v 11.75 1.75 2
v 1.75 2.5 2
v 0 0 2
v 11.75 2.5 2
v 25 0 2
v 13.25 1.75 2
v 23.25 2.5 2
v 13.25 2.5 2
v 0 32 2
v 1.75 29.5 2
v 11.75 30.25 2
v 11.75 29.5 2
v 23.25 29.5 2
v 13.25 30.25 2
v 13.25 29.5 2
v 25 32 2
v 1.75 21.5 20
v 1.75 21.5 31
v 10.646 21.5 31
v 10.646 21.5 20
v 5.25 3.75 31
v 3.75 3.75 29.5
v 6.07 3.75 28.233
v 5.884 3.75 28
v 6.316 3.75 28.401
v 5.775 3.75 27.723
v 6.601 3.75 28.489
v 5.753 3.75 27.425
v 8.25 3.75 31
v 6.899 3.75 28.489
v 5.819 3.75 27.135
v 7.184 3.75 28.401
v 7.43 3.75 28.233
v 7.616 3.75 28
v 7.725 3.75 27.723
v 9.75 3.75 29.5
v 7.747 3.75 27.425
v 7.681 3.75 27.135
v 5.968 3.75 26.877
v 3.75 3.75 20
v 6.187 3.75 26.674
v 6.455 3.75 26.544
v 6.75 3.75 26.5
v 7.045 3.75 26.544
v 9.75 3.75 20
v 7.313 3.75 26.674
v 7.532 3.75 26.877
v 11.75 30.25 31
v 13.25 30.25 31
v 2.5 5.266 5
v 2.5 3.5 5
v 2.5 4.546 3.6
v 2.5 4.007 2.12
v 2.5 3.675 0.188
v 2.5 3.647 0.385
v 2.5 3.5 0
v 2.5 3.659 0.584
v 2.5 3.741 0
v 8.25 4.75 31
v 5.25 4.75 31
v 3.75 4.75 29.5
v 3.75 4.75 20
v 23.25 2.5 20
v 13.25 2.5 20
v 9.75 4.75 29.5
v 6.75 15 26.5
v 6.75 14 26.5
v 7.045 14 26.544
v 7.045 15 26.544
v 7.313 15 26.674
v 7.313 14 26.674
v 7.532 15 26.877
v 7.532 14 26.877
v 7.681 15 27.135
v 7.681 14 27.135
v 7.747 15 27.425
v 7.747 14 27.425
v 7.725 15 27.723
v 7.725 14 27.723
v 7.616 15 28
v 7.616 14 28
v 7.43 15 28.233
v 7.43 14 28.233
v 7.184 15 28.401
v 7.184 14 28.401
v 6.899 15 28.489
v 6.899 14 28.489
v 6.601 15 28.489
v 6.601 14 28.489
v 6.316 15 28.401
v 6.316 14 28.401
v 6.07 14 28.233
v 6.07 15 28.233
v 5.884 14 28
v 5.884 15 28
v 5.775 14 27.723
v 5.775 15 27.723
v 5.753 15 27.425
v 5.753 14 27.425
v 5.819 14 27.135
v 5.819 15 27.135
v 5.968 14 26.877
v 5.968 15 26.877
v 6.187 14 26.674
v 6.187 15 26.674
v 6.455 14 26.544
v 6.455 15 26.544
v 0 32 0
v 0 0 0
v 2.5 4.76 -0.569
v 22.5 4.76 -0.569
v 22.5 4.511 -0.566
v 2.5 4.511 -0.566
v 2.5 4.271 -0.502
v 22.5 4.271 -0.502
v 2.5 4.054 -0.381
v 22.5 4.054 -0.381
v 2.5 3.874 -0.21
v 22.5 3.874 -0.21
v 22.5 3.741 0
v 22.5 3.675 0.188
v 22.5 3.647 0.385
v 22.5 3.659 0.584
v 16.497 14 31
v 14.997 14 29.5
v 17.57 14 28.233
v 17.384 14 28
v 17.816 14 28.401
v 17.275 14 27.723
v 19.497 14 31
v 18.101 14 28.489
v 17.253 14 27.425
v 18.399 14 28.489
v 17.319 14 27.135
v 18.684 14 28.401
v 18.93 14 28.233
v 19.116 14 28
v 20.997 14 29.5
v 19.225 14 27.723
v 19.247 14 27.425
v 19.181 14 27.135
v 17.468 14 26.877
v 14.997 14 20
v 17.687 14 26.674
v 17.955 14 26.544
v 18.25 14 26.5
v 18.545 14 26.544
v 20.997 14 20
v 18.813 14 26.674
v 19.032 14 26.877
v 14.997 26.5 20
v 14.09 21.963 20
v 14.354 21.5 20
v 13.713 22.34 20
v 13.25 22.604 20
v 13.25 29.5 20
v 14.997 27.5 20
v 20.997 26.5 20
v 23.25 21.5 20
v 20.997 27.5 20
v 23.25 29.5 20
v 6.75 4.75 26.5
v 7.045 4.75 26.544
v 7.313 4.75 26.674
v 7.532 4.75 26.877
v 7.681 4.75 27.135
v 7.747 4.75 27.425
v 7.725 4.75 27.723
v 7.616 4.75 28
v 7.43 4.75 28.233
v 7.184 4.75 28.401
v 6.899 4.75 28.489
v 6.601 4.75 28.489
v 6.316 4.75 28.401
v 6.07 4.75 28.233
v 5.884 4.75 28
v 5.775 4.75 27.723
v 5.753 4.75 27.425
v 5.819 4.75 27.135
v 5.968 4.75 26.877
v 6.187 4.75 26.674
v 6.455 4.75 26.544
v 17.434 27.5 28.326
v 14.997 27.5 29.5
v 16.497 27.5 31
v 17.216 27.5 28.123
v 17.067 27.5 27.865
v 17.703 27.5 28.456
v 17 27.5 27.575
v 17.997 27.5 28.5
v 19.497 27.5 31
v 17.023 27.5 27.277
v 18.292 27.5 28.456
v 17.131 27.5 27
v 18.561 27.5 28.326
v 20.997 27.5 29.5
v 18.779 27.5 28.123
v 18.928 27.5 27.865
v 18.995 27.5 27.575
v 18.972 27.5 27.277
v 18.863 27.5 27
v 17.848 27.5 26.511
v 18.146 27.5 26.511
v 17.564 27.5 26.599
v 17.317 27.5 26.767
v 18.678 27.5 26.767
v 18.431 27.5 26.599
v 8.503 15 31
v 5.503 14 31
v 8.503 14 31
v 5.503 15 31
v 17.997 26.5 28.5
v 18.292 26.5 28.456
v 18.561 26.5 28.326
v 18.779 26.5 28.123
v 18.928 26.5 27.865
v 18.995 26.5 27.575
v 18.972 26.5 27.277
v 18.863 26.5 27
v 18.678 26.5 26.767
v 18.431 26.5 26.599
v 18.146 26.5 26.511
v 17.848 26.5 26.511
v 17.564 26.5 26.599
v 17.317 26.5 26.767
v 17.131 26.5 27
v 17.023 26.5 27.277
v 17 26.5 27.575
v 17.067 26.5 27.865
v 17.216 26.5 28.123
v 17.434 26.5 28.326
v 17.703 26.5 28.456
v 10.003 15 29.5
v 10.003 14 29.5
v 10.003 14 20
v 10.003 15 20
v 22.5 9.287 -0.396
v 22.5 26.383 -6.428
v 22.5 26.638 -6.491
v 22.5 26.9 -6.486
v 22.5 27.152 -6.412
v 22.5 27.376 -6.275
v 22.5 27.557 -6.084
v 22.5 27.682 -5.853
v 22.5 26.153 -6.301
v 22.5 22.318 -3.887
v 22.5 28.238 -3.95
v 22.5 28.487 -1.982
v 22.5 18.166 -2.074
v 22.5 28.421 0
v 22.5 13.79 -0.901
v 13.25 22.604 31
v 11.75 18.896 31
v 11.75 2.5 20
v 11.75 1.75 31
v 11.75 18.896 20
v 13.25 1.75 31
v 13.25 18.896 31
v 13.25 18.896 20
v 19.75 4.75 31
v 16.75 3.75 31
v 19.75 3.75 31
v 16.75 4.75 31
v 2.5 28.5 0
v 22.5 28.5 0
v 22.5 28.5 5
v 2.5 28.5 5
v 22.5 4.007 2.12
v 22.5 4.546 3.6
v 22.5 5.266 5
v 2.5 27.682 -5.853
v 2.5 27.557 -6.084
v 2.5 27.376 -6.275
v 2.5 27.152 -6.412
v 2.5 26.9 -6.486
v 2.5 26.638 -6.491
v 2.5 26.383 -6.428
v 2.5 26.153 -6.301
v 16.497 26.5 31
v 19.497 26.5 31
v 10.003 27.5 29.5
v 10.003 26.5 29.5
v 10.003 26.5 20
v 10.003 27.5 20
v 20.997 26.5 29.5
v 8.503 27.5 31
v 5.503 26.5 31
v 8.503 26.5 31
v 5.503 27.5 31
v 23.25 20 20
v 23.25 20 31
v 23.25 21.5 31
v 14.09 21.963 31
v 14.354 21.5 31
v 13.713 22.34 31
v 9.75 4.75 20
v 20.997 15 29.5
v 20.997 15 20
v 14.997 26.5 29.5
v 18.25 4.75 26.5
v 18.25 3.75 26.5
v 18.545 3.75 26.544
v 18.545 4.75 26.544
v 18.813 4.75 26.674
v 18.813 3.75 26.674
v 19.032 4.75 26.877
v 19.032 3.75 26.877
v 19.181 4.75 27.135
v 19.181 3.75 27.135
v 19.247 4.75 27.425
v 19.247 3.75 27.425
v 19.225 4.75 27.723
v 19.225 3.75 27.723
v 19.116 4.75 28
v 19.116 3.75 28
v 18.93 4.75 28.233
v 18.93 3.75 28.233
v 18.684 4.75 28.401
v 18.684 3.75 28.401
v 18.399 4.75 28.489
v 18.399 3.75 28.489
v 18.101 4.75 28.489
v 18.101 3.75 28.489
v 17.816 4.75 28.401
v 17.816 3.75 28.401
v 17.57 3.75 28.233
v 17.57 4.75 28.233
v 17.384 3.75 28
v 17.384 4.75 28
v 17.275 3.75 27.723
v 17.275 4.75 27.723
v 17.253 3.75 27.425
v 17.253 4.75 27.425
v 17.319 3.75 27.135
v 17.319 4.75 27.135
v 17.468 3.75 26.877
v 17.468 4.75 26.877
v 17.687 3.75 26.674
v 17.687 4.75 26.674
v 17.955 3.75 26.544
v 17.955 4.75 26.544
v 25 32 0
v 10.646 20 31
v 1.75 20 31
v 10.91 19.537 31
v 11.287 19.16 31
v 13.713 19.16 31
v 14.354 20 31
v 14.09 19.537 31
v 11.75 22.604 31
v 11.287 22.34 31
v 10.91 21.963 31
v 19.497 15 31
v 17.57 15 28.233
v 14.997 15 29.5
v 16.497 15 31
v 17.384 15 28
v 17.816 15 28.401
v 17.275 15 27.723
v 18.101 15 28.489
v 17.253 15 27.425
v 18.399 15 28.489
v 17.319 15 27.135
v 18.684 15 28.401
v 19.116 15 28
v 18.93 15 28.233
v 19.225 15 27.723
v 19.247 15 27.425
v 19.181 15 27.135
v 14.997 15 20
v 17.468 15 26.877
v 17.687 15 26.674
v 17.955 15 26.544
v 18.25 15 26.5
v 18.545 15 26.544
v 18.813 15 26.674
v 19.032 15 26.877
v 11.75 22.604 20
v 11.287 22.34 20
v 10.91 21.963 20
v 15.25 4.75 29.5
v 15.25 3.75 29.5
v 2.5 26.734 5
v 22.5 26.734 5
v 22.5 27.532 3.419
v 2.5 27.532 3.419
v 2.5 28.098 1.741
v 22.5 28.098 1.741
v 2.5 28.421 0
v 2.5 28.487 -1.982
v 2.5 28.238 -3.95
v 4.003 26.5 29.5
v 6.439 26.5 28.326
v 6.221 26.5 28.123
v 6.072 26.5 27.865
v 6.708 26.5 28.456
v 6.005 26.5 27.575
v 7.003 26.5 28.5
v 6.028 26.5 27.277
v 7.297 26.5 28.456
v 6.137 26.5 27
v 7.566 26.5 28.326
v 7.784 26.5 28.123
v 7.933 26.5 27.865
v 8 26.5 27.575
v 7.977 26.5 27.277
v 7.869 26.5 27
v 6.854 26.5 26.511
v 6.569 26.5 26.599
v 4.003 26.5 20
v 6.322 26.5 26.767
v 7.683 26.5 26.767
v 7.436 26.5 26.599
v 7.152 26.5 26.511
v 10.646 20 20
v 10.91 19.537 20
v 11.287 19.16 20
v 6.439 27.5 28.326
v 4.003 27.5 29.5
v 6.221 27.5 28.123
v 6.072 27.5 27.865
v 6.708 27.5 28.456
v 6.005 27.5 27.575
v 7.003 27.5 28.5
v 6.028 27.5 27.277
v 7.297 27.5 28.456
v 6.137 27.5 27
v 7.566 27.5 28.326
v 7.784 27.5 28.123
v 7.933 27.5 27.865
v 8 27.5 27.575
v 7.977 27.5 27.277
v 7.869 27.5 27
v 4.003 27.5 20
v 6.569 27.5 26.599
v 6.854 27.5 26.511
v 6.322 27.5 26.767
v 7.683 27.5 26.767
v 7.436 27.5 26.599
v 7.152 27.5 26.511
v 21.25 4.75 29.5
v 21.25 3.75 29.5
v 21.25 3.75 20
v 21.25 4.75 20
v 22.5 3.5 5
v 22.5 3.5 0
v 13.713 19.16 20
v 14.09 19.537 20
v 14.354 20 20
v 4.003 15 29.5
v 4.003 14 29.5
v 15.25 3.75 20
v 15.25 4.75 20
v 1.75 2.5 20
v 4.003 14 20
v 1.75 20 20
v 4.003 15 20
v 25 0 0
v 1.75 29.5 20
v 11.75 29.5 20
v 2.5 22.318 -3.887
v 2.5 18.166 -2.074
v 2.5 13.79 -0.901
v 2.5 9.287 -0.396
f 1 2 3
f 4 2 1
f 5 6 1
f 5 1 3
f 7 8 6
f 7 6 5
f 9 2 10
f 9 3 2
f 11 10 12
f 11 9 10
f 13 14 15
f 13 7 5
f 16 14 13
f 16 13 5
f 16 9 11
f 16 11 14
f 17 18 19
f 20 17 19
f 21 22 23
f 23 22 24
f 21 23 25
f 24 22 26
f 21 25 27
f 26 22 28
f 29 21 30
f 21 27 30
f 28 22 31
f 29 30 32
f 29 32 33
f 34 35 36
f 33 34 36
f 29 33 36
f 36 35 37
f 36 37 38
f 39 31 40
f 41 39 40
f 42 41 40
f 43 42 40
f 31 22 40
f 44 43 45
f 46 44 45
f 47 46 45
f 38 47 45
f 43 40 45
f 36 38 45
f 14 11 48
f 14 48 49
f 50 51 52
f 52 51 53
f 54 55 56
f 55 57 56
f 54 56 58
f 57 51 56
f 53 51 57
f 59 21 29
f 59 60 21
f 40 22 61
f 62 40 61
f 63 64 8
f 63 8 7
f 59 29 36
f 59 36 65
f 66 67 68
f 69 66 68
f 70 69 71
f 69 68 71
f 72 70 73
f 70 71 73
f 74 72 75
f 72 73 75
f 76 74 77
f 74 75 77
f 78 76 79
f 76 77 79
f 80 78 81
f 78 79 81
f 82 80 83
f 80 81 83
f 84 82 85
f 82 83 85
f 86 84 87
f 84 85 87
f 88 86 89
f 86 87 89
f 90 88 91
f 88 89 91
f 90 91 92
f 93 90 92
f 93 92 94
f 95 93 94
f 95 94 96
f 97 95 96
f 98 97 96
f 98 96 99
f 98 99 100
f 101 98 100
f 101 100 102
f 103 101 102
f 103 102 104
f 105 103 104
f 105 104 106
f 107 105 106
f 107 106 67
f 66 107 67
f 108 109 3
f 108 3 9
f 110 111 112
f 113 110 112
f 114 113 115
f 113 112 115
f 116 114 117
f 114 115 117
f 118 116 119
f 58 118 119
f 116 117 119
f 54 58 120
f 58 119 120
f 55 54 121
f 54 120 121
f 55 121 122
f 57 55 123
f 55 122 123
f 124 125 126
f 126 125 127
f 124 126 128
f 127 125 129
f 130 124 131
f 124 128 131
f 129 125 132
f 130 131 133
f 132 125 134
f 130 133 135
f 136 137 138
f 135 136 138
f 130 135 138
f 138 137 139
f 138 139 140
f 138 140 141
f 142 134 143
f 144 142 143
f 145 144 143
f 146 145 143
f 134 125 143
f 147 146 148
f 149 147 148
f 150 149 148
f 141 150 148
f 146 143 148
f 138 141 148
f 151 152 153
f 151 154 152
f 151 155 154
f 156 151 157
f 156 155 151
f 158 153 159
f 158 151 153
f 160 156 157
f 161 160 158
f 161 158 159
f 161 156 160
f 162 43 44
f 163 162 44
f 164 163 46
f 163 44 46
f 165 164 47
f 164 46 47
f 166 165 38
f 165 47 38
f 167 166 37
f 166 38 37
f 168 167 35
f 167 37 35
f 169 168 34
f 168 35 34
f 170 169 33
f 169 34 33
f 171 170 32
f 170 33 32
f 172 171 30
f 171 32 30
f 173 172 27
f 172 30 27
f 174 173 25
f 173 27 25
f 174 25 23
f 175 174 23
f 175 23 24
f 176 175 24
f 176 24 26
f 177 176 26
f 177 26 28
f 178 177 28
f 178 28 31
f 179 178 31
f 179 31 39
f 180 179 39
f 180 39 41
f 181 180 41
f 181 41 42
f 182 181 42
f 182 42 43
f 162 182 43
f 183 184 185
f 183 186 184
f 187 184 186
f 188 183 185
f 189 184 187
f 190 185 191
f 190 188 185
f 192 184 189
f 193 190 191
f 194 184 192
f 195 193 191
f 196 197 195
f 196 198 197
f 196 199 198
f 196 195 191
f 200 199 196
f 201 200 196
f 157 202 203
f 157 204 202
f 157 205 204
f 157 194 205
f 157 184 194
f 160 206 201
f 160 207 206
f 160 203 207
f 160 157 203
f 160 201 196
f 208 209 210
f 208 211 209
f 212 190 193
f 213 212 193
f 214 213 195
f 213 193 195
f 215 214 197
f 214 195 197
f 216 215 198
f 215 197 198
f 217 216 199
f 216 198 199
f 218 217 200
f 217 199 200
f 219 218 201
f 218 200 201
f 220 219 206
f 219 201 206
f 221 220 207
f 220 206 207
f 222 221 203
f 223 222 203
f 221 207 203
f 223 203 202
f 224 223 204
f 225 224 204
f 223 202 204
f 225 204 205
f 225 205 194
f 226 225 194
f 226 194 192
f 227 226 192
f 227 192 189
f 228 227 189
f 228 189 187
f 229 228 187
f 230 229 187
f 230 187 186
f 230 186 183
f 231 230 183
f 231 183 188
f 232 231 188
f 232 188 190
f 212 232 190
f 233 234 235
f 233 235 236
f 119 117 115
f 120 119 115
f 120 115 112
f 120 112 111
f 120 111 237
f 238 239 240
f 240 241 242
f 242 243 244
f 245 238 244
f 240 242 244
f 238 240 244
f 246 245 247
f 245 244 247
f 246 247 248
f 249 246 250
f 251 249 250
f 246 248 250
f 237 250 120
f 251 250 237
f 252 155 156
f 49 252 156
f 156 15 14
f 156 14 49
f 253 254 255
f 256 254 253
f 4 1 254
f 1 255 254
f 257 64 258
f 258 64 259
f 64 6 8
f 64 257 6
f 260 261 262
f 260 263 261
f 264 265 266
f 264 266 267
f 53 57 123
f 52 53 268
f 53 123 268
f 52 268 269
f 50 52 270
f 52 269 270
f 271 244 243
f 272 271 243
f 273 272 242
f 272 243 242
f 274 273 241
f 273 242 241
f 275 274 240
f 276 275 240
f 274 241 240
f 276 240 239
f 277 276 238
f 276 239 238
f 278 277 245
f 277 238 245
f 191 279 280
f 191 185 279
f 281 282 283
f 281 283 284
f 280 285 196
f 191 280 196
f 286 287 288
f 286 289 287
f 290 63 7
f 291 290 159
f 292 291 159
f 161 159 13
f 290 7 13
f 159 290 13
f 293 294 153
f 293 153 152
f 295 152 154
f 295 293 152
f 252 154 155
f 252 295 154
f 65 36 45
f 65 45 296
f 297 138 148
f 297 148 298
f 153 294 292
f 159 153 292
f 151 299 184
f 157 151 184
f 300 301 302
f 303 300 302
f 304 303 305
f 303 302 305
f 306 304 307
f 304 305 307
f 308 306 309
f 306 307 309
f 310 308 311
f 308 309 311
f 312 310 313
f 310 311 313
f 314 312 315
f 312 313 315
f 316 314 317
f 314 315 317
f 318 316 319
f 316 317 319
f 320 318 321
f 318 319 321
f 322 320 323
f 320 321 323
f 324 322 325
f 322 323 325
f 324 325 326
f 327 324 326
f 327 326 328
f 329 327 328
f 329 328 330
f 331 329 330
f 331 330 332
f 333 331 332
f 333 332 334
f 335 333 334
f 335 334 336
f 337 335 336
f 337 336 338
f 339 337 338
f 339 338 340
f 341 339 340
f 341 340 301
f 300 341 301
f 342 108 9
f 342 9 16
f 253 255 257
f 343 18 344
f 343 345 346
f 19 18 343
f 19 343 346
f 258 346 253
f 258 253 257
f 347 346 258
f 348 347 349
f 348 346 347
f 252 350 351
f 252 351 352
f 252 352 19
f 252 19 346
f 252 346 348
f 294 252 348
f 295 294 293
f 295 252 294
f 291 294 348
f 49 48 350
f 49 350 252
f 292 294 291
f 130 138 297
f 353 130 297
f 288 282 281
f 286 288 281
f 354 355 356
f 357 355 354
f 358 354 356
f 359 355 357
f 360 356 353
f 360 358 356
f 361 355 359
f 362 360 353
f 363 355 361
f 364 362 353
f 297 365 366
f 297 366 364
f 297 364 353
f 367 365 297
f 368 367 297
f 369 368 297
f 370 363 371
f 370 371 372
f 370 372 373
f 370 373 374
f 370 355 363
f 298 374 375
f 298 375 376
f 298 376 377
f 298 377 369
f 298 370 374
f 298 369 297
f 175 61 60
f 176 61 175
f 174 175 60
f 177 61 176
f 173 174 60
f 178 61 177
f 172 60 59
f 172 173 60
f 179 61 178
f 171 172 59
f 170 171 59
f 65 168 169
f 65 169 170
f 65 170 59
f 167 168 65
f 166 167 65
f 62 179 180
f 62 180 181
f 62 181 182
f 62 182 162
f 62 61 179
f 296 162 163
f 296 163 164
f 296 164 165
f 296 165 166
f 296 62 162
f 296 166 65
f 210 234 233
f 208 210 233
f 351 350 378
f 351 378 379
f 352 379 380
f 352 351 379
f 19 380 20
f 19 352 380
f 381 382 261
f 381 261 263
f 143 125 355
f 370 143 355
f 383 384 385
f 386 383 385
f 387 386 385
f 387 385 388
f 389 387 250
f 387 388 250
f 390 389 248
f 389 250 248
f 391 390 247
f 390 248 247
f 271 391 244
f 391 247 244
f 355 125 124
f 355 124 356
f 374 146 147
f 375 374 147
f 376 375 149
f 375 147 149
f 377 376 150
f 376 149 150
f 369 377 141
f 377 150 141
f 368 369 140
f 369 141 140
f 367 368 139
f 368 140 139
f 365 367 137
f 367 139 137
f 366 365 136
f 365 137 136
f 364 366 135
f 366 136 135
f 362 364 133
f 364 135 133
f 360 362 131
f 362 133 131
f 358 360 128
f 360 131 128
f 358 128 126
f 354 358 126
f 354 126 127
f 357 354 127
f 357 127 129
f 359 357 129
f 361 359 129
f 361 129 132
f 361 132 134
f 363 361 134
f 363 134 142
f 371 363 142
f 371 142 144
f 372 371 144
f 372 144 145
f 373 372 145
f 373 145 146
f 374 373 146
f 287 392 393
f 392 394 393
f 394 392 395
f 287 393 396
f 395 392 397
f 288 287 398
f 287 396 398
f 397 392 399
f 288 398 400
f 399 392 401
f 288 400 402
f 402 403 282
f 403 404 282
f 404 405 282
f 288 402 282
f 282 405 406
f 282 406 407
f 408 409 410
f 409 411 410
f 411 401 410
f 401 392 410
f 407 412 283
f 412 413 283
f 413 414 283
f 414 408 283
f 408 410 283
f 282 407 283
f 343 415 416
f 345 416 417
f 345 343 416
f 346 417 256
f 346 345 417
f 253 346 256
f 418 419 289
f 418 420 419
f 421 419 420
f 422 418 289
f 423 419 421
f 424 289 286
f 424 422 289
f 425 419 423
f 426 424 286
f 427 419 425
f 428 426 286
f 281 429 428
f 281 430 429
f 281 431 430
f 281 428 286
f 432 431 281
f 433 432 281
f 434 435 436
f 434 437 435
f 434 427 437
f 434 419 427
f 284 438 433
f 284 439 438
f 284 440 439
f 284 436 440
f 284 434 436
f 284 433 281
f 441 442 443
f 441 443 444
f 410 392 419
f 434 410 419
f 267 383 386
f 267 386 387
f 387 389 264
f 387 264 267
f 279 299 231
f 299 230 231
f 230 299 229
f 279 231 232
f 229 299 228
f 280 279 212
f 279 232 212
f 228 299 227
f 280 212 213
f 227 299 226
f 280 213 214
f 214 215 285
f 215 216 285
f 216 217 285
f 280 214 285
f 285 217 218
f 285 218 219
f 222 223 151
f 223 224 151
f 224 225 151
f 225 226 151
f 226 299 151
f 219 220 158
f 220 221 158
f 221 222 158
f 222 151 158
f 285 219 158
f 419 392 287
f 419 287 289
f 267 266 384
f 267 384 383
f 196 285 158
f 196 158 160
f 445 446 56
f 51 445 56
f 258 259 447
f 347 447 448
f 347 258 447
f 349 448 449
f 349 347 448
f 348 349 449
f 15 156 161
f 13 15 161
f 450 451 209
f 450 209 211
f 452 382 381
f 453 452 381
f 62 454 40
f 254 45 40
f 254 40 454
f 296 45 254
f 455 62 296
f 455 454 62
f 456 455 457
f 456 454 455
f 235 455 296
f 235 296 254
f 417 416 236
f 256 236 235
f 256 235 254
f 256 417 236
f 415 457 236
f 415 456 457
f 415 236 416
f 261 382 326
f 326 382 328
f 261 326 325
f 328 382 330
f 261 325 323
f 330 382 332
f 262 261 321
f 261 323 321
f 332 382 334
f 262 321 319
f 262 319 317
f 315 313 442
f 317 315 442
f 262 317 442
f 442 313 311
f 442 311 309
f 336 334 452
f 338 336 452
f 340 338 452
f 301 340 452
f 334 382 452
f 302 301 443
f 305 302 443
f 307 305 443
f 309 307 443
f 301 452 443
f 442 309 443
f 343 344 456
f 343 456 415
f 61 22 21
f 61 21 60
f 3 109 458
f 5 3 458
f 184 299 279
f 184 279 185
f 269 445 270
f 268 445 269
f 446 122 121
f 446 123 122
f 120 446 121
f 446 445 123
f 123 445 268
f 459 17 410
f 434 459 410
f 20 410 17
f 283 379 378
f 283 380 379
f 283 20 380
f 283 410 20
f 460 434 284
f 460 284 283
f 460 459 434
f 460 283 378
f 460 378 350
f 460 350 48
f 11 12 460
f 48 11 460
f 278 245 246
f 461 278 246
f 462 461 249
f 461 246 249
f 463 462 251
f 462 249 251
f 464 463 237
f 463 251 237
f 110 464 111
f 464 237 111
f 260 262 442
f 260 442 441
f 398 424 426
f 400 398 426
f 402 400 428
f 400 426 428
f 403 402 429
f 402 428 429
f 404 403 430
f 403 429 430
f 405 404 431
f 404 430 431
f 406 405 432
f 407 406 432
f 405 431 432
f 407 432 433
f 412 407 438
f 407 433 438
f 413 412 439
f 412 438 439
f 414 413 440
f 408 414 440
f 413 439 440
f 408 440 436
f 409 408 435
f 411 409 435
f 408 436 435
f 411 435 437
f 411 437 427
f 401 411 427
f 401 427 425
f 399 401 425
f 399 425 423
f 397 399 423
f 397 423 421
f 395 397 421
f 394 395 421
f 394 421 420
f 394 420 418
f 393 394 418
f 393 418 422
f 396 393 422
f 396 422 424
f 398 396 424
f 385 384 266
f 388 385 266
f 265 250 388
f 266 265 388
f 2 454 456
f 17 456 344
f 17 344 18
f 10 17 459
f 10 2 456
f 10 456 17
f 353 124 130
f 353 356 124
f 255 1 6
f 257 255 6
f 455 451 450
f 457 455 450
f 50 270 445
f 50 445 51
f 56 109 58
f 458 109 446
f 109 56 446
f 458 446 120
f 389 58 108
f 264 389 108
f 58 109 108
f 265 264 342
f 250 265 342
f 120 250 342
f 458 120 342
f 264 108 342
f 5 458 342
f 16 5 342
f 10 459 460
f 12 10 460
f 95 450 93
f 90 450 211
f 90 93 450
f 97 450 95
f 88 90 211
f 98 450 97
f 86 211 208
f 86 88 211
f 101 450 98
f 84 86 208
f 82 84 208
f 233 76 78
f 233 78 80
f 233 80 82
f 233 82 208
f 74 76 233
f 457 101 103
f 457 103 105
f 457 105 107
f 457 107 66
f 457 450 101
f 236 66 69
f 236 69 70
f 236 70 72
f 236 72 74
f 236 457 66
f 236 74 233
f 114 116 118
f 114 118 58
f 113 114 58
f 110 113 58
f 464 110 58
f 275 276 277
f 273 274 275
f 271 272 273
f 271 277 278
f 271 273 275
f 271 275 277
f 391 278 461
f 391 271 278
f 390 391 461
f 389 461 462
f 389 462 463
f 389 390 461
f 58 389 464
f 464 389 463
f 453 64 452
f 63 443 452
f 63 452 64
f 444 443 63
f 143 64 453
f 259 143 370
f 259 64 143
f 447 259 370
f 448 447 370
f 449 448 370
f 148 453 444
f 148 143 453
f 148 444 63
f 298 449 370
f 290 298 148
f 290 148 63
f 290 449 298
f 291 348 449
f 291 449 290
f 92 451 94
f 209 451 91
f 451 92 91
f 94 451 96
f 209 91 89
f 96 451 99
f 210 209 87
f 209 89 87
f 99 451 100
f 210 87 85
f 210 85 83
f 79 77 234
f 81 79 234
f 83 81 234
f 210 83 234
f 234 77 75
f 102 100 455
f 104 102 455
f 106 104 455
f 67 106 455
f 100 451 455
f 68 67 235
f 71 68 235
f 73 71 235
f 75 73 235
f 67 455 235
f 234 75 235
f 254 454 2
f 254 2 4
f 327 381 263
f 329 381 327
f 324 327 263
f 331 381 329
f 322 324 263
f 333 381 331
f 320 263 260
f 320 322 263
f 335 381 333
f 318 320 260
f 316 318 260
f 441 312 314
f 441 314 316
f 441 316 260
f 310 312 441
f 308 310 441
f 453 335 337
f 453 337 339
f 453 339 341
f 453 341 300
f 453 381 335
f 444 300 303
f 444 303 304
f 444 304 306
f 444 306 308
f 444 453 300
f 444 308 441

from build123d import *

# Parameters (mm, degrees)
SKETCH_1_W          = 25
SKETCH_1_H          = 32
EXTRUDE_1_DEPTH     = 2
SKETCH_2_W          = 21.5
SKETCH_2_H          = 27
EXTRUDE_2_DEPTH     = 18
SKETCH_3_W          = 1.5
SKETCH_3_H          = 28.5
EXTRUDE_3_DEPTH     = 29
SKETCH_4_W          = 21.5
SKETCH_4_H          = 1.5
EXTRUDE_4_DEPTH     = 11
SKETCH_6_R          = 2
EXTRUDE_5_DEPTH     = 11
SKETCH_7_W          = 6
SKETCH_7_H          = 1
EXTRUDE_6_DEPTH     = 11
SKETCH_8_R          = 1
CUT_EXTRUDE_1_DEPTH = 15
SKETCH_9_R          = 1
CUT_EXTRUDE_2_DEPTH = 5
CHAMFER_1_SIZE      = 1.5
SKETCH_10_W         = 20
SKETCH_10_H         = 25
CUT_EXTRUDE_3_DEPTH = 5
EXTRUDE_7_DEPTH     = 20


with BuildPart() as part:
    # Эскиз1 → Бобышка-Вытянуть1 (new body)
    with BuildSketch(Plane.XY):
        with Locations((12.5, 16)):
            Rectangle(SKETCH_1_W, SKETCH_1_H)
    extrude(amount=EXTRUDE_1_DEPTH)

    # Эскиз2 → Бобышка-Вытянуть2 (add)
    with BuildSketch(Plane.XY.offset(2)):
        with Locations((12.5, 16)):
            Rectangle(SKETCH_2_W, SKETCH_2_H)
    extrude(amount=EXTRUDE_2_DEPTH)

    # Эскиз3 → Бобышка-Вытянуть3 (add)
    with BuildSketch(Plane.XY.offset(2)):
        with Locations((12.5, 16)):
            Rectangle(SKETCH_3_W, SKETCH_3_H)
    extrude(amount=EXTRUDE_3_DEPTH)

    # Эскиз4 → Бобышка-Вытянуть4 (add)
    with BuildSketch(Plane.XY.offset(20)):
        with Locations((12.5, 20.75)):
            Rectangle(SKETCH_4_W, SKETCH_4_H)
    extrude(amount=EXTRUDE_4_DEPTH)

    # Эскиз6 → Бобышка-Вытянуть5 (add)
    with BuildSketch(Plane.XY.offset(31)):
        with Locations((12.5, 20.75)):
            Circle(SKETCH_6_R)
    extrude(amount=-EXTRUDE_5_DEPTH)

    # Эскиз7 → Бобышка-Вытянуть6 (add)
    with BuildSketch(Plane.XY.offset(20)):
        with Locations((7.002560395, 27)):
            Rectangle(SKETCH_7_W, SKETCH_7_H)
        with Locations((6.75, 4.25)):
            Rectangle(SKETCH_7_W, SKETCH_7_H)
        with Locations((7.002560395, 14.5)):
            Rectangle(SKETCH_7_W, SKETCH_7_H)
        with Locations((18.25, 4.25)):
            Rectangle(SKETCH_7_W, SKETCH_7_H)
        with Locations((17.997439605, 14.5)):
            Rectangle(SKETCH_7_W, SKETCH_7_H)
        with Locations((17.997439605, 27)):
            Rectangle(SKETCH_7_W, SKETCH_7_H)
    extrude(amount=EXTRUDE_6_DEPTH)

    # Эскиз8 → Вырез-Вытянуть1 (cut)
    with BuildSketch(Plane.XZ.offset(-3.75)):
        with Locations(Location((6.75, 27.5, 0), (0, 0, 270))):
            Circle(SKETCH_8_R)
        with Locations(Location((18.25, 27.5, 0), (0, 0, 270))):
            Circle(SKETCH_8_R)
    extrude(amount=-CUT_EXTRUDE_1_DEPTH, mode=Mode.SUBTRACT)

    # Эскиз9 → Вырез-Вытянуть2 (cut)
    with BuildSketch(Plane(origin=(0, 27.5, 0), x_dir=(1, 0, 0), z_dir=(0, 1, 0))):
        with Locations(Location((17.997439605, -27.5, 0), (0, 0, 270))):
            Circle(SKETCH_9_R)
        with Locations(Location((7.002560395, -27.5, 0), (0, 0, 270))):
            Circle(SKETCH_9_R)
    extrude(amount=-CUT_EXTRUDE_2_DEPTH, mode=Mode.SUBTRACT)

    # Фаска1
    chamfer_1_edges = [part.edges().sort_by_distance(p)[0] for p in [
        (4.002560395, 27, 31),
        (10.002560395, 27, 31),
        (9.75, 4.25, 31),
        (3.75, 4.25, 31),
        (10.002560395, 14.5, 31),
        (4.002560395, 14.5, 31),
        (21.25, 4.25, 31),
        (15.25, 4.25, 31),
        (20.997439605, 14.5, 31),
        (14.997439605, 14.5, 31),
        (14.997439605, 27, 31),
        (20.997439605, 27, 31),
    ]]
    chamfer(chamfer_1_edges, length=CHAMFER_1_SIZE)

    # Эскиз10 → Вырез-Вытянуть3 (cut)
    with BuildSketch(Plane(origin=(0, 0, 0), x_dir=(-1, 0, 0), z_dir=(0, 0, -1))):
        with Locations((-12.5, 16)):
            Rectangle(SKETCH_10_W, SKETCH_10_H)
    extrude(amount=-CUT_EXTRUDE_3_DEPTH, mode=Mode.SUBTRACT)

    # Эскиз12 → Бобышка-Вытянуть7 (add)
    with BuildSketch(Plane.ZY.offset(-22.5)):
        with BuildLine():
            Line((5, 5.26592597), (5, 26.73407403))
            ThreePointArc((5, 26.73407403), (-0.317848235, 28.452595927), (-5.853095184, 27.68196724))
            ThreePointArc((-5.853095184, 27.68196724), (-6.456920042, 27.028650367), (-6.301261639, 26.152752053))
            ThreePointArc((-6.301261639, 26.152752053), (-1.405439464, 16), (-0.568969813, 4.759547716))
            ThreePointArc((-0.568969813, 4.759547716), (-0.265824787, 3.923168323), (0.583761316, 3.659291744))
            ThreePointArc((0.583761316, 3.659291744), (2.86806198, 4.253205313), (5, 5.26592597))
        make_face()
    extrude(amount=EXTRUDE_7_DEPTH)


solid = part.part
